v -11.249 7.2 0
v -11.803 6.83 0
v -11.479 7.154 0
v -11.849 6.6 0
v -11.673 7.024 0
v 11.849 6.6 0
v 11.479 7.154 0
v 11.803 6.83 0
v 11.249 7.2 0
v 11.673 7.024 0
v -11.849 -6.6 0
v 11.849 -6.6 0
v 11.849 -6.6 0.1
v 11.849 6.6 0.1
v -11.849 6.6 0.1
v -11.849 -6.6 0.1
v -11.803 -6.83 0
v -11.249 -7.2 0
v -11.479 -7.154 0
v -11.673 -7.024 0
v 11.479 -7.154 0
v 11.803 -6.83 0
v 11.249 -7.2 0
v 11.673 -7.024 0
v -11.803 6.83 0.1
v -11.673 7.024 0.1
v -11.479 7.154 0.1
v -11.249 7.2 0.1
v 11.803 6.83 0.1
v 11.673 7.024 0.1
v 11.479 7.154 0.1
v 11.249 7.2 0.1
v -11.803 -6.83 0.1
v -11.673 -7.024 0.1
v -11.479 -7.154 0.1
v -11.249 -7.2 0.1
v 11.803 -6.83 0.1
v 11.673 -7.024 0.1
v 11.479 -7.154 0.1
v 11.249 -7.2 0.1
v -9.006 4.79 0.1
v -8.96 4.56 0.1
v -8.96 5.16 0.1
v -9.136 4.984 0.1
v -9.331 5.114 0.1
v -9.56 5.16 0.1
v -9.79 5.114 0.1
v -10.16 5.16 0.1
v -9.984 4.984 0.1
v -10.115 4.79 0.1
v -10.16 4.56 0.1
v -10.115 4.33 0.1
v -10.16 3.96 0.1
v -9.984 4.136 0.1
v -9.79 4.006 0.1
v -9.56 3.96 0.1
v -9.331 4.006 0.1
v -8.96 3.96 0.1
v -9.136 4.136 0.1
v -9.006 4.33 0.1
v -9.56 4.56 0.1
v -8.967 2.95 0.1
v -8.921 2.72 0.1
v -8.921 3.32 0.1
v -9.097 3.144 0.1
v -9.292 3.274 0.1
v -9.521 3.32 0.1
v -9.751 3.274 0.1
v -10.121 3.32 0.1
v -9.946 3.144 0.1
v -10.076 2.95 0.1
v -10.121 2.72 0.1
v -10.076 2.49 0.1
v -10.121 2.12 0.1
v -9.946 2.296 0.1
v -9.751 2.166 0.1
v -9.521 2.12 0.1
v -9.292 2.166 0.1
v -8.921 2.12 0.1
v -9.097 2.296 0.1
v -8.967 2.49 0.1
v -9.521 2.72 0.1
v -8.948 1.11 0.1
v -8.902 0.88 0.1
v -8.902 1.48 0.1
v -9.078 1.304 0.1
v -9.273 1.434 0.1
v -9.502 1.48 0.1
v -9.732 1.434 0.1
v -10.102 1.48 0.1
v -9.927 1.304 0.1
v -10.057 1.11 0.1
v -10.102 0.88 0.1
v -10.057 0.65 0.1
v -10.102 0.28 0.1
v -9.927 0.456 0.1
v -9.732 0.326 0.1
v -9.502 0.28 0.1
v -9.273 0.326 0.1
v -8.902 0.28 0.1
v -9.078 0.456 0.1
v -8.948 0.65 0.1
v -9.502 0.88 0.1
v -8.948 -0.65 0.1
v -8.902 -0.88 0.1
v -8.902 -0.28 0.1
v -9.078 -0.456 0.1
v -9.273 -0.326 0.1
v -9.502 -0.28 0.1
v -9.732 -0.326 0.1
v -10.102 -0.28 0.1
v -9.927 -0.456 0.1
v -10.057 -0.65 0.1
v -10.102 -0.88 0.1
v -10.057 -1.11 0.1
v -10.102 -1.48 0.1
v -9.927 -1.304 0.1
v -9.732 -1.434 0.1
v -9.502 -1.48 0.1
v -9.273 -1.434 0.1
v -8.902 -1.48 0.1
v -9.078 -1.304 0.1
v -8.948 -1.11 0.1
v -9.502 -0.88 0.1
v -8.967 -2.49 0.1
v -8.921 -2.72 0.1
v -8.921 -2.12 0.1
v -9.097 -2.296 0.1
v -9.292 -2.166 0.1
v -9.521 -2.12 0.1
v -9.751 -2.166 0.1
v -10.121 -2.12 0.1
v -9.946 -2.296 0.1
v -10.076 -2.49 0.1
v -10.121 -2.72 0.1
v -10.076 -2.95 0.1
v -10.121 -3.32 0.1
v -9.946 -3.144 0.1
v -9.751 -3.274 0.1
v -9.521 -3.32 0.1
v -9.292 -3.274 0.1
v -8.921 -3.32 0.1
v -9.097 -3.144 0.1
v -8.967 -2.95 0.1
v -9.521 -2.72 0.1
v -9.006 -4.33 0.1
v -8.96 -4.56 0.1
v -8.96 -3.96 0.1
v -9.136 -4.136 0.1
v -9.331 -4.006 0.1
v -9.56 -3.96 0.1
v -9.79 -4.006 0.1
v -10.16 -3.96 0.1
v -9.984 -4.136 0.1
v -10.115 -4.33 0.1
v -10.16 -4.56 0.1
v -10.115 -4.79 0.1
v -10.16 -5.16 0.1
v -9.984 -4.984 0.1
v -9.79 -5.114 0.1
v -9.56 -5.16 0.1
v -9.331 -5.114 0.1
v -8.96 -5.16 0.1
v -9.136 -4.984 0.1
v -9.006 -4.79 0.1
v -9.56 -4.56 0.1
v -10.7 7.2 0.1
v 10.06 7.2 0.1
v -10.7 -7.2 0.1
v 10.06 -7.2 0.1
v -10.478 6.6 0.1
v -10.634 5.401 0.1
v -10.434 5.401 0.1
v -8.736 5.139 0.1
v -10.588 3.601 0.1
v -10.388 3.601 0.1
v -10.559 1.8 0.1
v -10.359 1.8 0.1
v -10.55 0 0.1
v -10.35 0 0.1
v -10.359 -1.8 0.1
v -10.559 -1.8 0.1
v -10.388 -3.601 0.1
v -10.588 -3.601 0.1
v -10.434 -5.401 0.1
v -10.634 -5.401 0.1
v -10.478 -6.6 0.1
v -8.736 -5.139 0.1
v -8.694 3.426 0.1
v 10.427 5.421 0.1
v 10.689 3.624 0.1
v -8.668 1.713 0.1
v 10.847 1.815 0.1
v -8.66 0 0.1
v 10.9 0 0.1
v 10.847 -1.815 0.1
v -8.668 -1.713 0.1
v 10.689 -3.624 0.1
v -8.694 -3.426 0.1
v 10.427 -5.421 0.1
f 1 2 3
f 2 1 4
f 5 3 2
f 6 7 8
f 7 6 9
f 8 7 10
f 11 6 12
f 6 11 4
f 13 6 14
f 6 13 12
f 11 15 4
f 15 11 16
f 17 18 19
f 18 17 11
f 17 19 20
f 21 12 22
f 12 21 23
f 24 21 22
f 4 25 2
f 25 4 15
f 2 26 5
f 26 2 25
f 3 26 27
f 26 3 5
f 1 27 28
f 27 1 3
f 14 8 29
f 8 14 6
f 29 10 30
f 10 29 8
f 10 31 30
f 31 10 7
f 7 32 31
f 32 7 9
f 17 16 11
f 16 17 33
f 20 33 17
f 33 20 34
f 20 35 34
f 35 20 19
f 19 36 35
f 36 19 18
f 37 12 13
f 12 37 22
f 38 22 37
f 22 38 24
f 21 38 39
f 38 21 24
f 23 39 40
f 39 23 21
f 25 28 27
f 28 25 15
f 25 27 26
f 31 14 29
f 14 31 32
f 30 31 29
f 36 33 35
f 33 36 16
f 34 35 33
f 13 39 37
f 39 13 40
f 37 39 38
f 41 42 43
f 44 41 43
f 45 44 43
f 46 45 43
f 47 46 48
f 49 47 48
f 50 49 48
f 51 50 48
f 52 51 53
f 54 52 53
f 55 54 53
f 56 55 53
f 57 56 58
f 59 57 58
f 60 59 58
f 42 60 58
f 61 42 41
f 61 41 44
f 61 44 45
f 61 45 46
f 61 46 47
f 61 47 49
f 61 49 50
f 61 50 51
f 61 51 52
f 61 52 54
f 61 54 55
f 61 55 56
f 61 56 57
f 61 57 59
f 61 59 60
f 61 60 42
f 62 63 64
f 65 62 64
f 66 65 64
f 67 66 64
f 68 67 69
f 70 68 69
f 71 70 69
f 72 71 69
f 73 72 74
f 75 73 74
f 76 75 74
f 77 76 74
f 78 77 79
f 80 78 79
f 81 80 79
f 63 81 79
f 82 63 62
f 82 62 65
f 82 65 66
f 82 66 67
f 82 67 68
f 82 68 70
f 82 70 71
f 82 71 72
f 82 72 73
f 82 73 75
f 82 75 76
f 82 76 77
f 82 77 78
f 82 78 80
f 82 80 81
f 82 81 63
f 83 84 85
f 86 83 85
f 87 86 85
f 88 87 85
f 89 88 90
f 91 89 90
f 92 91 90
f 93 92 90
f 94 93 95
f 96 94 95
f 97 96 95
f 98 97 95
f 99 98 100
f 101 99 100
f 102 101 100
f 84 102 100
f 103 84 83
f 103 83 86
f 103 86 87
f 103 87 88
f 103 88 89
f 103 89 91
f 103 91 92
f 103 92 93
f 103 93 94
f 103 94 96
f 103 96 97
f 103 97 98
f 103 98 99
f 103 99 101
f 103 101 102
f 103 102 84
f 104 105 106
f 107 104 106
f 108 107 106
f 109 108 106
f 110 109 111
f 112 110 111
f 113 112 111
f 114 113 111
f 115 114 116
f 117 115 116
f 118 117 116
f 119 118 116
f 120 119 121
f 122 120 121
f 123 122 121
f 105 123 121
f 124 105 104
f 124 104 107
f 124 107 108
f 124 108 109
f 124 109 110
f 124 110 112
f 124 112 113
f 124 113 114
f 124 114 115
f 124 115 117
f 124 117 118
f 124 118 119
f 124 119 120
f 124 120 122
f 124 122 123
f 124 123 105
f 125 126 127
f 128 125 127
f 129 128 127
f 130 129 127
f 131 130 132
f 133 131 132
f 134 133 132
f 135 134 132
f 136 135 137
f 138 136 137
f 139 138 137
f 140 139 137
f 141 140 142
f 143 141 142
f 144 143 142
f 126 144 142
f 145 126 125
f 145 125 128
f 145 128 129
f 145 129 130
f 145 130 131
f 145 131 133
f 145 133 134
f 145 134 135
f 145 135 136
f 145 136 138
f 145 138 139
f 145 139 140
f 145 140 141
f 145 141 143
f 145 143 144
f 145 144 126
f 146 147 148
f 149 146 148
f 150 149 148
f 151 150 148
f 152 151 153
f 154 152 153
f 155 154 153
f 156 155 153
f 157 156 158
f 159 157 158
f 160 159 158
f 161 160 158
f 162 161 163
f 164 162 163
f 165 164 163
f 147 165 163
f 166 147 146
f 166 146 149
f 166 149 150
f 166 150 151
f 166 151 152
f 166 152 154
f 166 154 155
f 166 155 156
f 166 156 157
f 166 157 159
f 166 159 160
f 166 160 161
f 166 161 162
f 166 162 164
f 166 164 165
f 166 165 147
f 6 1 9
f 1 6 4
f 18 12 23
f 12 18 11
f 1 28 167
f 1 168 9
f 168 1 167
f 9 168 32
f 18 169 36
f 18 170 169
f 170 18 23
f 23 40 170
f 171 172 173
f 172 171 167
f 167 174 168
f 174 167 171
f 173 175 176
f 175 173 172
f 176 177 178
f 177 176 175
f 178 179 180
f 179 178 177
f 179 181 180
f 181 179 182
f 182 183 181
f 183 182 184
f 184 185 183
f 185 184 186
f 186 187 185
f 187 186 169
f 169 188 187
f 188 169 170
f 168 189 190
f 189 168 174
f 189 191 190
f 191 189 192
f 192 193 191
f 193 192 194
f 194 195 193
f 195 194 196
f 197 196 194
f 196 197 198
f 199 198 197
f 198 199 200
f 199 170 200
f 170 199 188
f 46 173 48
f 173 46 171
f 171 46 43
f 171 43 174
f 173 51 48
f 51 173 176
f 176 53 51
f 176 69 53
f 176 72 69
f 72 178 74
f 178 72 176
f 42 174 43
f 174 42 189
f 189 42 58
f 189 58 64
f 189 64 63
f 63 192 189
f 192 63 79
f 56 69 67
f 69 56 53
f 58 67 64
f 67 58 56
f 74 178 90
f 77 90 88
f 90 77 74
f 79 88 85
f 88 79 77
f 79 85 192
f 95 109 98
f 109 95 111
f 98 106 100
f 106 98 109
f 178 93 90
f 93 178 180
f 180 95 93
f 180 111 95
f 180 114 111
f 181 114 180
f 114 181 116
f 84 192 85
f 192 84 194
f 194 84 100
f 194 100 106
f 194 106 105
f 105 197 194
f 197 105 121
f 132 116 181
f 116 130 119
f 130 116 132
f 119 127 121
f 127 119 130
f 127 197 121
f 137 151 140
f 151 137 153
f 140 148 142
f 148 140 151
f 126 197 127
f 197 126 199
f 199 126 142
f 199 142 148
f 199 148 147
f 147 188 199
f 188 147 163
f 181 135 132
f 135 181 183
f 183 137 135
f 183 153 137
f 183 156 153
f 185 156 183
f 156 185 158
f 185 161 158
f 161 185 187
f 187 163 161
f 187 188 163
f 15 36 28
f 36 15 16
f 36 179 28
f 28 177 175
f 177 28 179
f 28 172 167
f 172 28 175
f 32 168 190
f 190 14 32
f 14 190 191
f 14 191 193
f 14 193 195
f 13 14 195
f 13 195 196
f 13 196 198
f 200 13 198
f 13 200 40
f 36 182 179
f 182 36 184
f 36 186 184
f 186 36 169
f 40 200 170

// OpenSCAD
// file: ../p/box3u12.scad
use <../lib.scad>
function ldraw_lib__box3u12() = [
// 0 Box with 3 Parallel Faces without Any Edges
// 0 Name: box3u12.dat
// 0 Author: J.C. Tchang [tchang]
// 0 !LDRAW_ORG Primitive UPDATE 2014-02
// 0 !LICENSE Licensed under CC BY 4.0 : see CAreadme.txt
// 
// 0 BFC CERTIFY CCW
  [0,"BFC","CERTIFY"],
  [0,"BFC","CCW"],
// 
// 0 !HISTORY 2014-12-23 [PTadmin] Official Update 2014-02
// 
// 
// 4 16 -1 1 1 1 1 1 1 1 -1 -1 1 -1
  [4,16,-1,1,1,1,1,1,1,1,-1,-1,1,-1],
// 4 16 -1 1 1 -1 0 1 1 0 1 1 1 1
  [4,16,-1,1,1,-1,0,1,1,0,1,1,1,1],
// 4 16 1 1 -1 1 0 -1 -1 0 -1 -1 1 -1
  [4,16,1,1,-1,1,0,-1,-1,0,-1,-1,1,-1],
];
module ldraw_lib__box3u12(step=0, col=false, unit=2/5, alt=false, line=0.2, solid=!$preview)
    makepoly(ldraw_lib__box3u12(), step=step, col=col, unit=unit, alt=alt, line=line, solid=solid);
ldraw_lib__box3u12(line=0.2);
// file: ../p/4-4ndis.scad
use <../lib.scad>
function ldraw_lib__4_4ndis() = [
// 0 Disc Negative 1.0
// 0 Name: 4-4ndis.dat
// 0 Author: James Jessiman
// 0 !LDRAW_ORG Primitive UPDATE 2012-01
// 0 !LICENSE Licensed under CC BY 4.0 : see CAreadme.txt
// 
// 0 BFC CERTIFY CCW
  [0,"BFC","CERTIFY"],
  [0,"BFC","CCW"],
// 
// 0 !HISTORY 2002-03-23 [sbliss] Added BFC statement; compacted code
// 0 !HISTORY 2002-04-25 [PTadmin] Official Update 2002-02
// 0 !HISTORY 2007-06-24 [PTadmin] Header formatted for Contributor Agreement
// 0 !HISTORY 2008-07-01 [PTadmin] Official Update 2008-01
// 0 !HISTORY 2012-02-16 [Philo] Changed to CCW
// 0 !HISTORY 2012-03-30 [PTadmin] Official Update 2012-01
// 
// 
// 3 16 0.9239 0 0.3827 1 0 0 1 0 1
  [3,16,0.9239,0,0.3827,1,0,0,1,0,1],
// 3 16 0.7071 0 0.7071 0.9239 0 0.3827 1 0 1
  [3,16,0.7071,0,0.7071,0.9239,0,0.3827,1,0,1],
// 3 16 0.3827 0 0.9239 0.7071 0 0.7071 1 0 1
  [3,16,0.3827,0,0.9239,0.7071,0,0.7071,1,0,1],
// 3 16 0 0 1 0.3827 0 0.9239 1 0 1
  [3,16,0,0,1,0.3827,0,0.9239,1,0,1],
// 3 16 -0.3827 0 0.9239 0 0 1 -1 0 1
  [3,16,-0.3827,0,0.9239,0,0,1,-1,0,1],
// 3 16 -0.7071 0 0.7071 -0.3827 0 0.9239 -1 0 1
  [3,16,-0.7071,0,0.7071,-0.3827,0,0.9239,-1,0,1],
// 3 16 -0.9239 0 0.3827 -0.7071 0 0.7071 -1 0 1
  [3,16,-0.9239,0,0.3827,-0.7071,0,0.7071,-1,0,1],
// 3 16 -1 0 0 -0.9239 0 0.3827 -1 0 1
  [3,16,-1,0,0,-0.9239,0,0.3827,-1,0,1],
// 3 16 -0.9239 0 -0.3827 -1 0 0 -1 0 -1
  [3,16,-0.9239,0,-0.3827,-1,0,0,-1,0,-1],
// 3 16 -0.7071 0 -0.7071 -0.9239 0 -0.3827 -1 0 -1
  [3,16,-0.7071,0,-0.7071,-0.9239,0,-0.3827,-1,0,-1],
// 3 16 -0.3827 0 -0.9239 -0.7071 0 -0.7071 -1 0 -1
  [3,16,-0.3827,0,-0.9239,-0.7071,0,-0.7071,-1,0,-1],
// 3 16 0 0 -1 -0.3827 0 -0.9239 -1 0 -1
  [3,16,0,0,-1,-0.3827,0,-0.9239,-1,0,-1],
// 3 16 0.3827 0 -0.9239 0 0 -1 1 0 -1
  [3,16,0.3827,0,-0.9239,0,0,-1,1,0,-1],
// 3 16 0.7071 0 -0.7071 0.3827 0 -0.9239 1 0 -1
  [3,16,0.7071,0,-0.7071,0.3827,0,-0.9239,1,0,-1],
// 3 16 0.9239 0 -0.3827 0.7071 0 -0.7071 1 0 -1
  [3,16,0.9239,0,-0.3827,0.7071,0,-0.7071,1,0,-1],
// 3 16 1 0 0 0.9239 0 -0.3827 1 0 -1
  [3,16,1,0,0,0.9239,0,-0.3827,1,0,-1],
];
module ldraw_lib__4_4ndis(step=0, col=false, unit=2/5, alt=false, line=0.2, solid=!$preview)
    makepoly(ldraw_lib__4_4ndis(), step=step, col=col, unit=unit, alt=alt, line=line, solid=solid);
ldraw_lib__4_4ndis(line=0.2);
// file: ../p/4-4disc.scad
use <../lib.scad>
function ldraw_lib__4_4disc() = [
// 0 Disc 1.0
// 0 Name: 4-4disc.dat
// 0 Author: James Jessiman
// 0 !LDRAW_ORG Primitive UPDATE 2002-02
// 0 !LICENSE Licensed under CC BY 4.0 : see CAreadme.txt
// 
// 0 BFC CERTIFY CCW
  [0,"BFC","CERTIFY"],
  [0,"BFC","CCW"],
// 
// 0 !HISTORY 1998-12-15 [PTadmin] Official Update 1998-10
// 0 !HISTORY 2002-03-23 [sbliss] Added BFC statement
// 0 !HISTORY 2002-04-25 [PTadmin] Official Update 2002-02
// 0 !HISTORY 2007-06-24 [PTadmin] Header formatted for Contributor Agreement
// 0 !HISTORY 2008-07-01 [PTadmin] Official Update 2008-01
// 
// 
// 3 16 0 0 0 1 0 0 0.9239 0 0.3827
  [3,16,0,0,0,1,0,0,0.9239,0,0.3827],
// 3 16 0 0 0 0.9239 0 0.3827 0.7071 0 0.7071
  [3,16,0,0,0,0.9239,0,0.3827,0.7071,0,0.7071],
// 3 16 0 0 0 0.7071 0 0.7071 0.3827 0 0.9239
  [3,16,0,0,0,0.7071,0,0.7071,0.3827,0,0.9239],
// 3 16 0 0 0 0.3827 0 0.9239 0 0 1
  [3,16,0,0,0,0.3827,0,0.9239,0,0,1],
// 3 16 0 0 0 0 0 1 -0.3827 0 0.9239
  [3,16,0,0,0,0,0,1,-0.3827,0,0.9239],
// 3 16 0 0 0 -0.3827 0 0.9239 -0.7071 0 0.7071
  [3,16,0,0,0,-0.3827,0,0.9239,-0.7071,0,0.7071],
// 3 16 0 0 0 -0.7071 0 0.7071 -0.9239 0 0.3827
  [3,16,0,0,0,-0.7071,0,0.7071,-0.9239,0,0.3827],
// 3 16 0 0 0 -0.9239 0 0.3827 -1 0 -0
  [3,16,0,0,0,-0.9239,0,0.3827,-1,0,-0],
// 3 16 0 0 0 -1 0 -0 -0.9239 0 -0.3827
  [3,16,0,0,0,-1,0,-0,-0.9239,0,-0.3827],
// 3 16 0 0 0 -0.9239 0 -0.3827 -0.7071 0 -0.7071
  [3,16,0,0,0,-0.9239,0,-0.3827,-0.7071,0,-0.7071],
// 3 16 0 0 0 -0.7071 0 -0.7071 -0.3827 0 -0.9239
  [3,16,0,0,0,-0.7071,0,-0.7071,-0.3827,0,-0.9239],
// 3 16 0 0 0 -0.3827 0 -0.9239 0 0 -1
  [3,16,0,0,0,-0.3827,0,-0.9239,0,0,-1],
// 3 16 0 0 0 0 0 -1 0.3827 0 -0.9239
  [3,16,0,0,0,0,0,-1,0.3827,0,-0.9239],
// 3 16 0 0 0 0.3827 0 -0.9239 0.7071 0 -0.7071
  [3,16,0,0,0,0.3827,0,-0.9239,0.7071,0,-0.7071],
// 3 16 0 0 0 0.7071 0 -0.7071 0.9239 0 -0.3827
  [3,16,0,0,0,0.7071,0,-0.7071,0.9239,0,-0.3827],
// 3 16 0 0 0 0.9239 0 -0.3827 1 0 0
  [3,16,0,0,0,0.9239,0,-0.3827,1,0,0],
// 0
];
module ldraw_lib__4_4disc(step=0, col=false, unit=2/5, alt=false, line=0.2, solid=!$preview)
    makepoly(ldraw_lib__4_4disc(), step=step, col=col, unit=unit, alt=alt, line=line, solid=solid);
ldraw_lib__4_4disc(line=0.2);
// file: ../p/1-4cyli.scad
use <../lib.scad>
function ldraw_lib__1_4cyli() = [
// 0 Cylinder 0.25
// 0 Name: 1-4cyli.dat
// 0 Author: James Jessiman
// 0 !LDRAW_ORG Primitive UPDATE 2012-01
// 0 !LICENSE Licensed under CC BY 4.0 : see CAreadme.txt
// 
// 0 BFC CERTIFY CCW
  [0,"BFC","CERTIFY"],
  [0,"BFC","CCW"],
// 
// 0 !HISTORY 2002-03-23 [sbliss] Added BFC statement.
// 0 !HISTORY 2002-04-25 [PTadmin] Official Update 2002-02
// 0 !HISTORY 2007-06-22 [PTadmin] Header formatted for Contributor Agreement
// 0 !HISTORY 2008-07-01 [PTadmin] Official Update 2008-01
// 0 !HISTORY 2012-02-16 [Philo] Changed to CCW
// 0 !HISTORY 2012-03-30 [PTadmin] Official Update 2012-01
// 
// 
// 4 16 1 1 0 0.9239 1 0.3827 0.9239 0 0.3827 1 0 0
  [4,16,1,1,0,0.9239,1,0.3827,0.9239,0,0.3827,1,0,0],
// 5 24 1 0 0 1 1 0 0.9239 0 0.3827 1 0 -1
  [5,24,1,0,0,1,1,0,0.9239,0,0.3827,1,0,-1],
// 4 16 0.9239 1 0.3827 0.7071 1 0.7071 0.7071 0 0.7071 0.9239 0 0.3827
  [4,16,0.9239,1,0.3827,0.7071,1,0.7071,0.7071,0,0.7071,0.9239,0,0.3827],
// 5 24 0.9239 0 0.3827 0.9239 1 0.3827 0.7071 0 0.7071 1 0 0
  [5,24,0.9239,0,0.3827,0.9239,1,0.3827,0.7071,0,0.7071,1,0,0],
// 4 16 0.7071 1 0.7071 0.3827 1 0.9239 0.3827 0 0.9239 0.7071 0 0.7071
  [4,16,0.7071,1,0.7071,0.3827,1,0.9239,0.3827,0,0.9239,0.7071,0,0.7071],
// 5 24 0.7071 0 0.7071 0.7071 1 0.7071 0.3827 0 0.9239 0.9239 0 0.3827
  [5,24,0.7071,0,0.7071,0.7071,1,0.7071,0.3827,0,0.9239,0.9239,0,0.3827],
// 4 16 0.3827 1 0.9239 0 1 1 0 0 1 0.3827 0 0.9239
  [4,16,0.3827,1,0.9239,0,1,1,0,0,1,0.3827,0,0.9239],
// 5 24 0.3827 0 0.9239 0.3827 1 0.9239 0 0 1 0.7071 0 0.7071
  [5,24,0.3827,0,0.9239,0.3827,1,0.9239,0,0,1,0.7071,0,0.7071],
// 5 24 0 0 1 0 1 1 0.3827 0 0.9239 -1 0 1
  [5,24,0,0,1,0,1,1,0.3827,0,0.9239,-1,0,1],
];
module ldraw_lib__1_4cyli(step=0, col=false, unit=2/5, alt=false, line=0.2, solid=!$preview)
    makepoly(ldraw_lib__1_4cyli(), step=step, col=col, unit=unit, alt=alt, line=line, solid=solid);
ldraw_lib__1_4cyli(line=0.2);
// file: ../p/1-4chrd.scad
use <../lib.scad>
function ldraw_lib__1_4chrd() = [
// 0 Chord 0.25
// 0 Name: 1-4chrd.dat
// 0 Author: Max Martin Richter [MMR1988]
// 0 !LDRAW_ORG Primitive UPDATE 2023-05
// 0 !LICENSE Licensed under CC BY 4.0 : see CAreadme.txt
// 
// 0 BFC CERTIFY CCW
  [0,"BFC","CERTIFY"],
  [0,"BFC","CCW"],
// 
// 0 !HISTORY 2004-04-22 [PTadmin] Official Update 2004-02
// 0 !HISTORY 2007-10-09 [PTadmin] Header formatted for Contributor Agreement
// 0 !HISTORY 2008-07-01 [PTadmin] Official Update 2008-01
// 0 !HISTORY 2012-08-02 [MMR1988] Re-creation with PrimGen2 and Rectifier
// 0 !HISTORY 2012-08-09 [PTadmin] Official Update 2012-02
// 0 !HISTORY 2023-10-27 [OrionP] Change author to MMR1988 from hafhead
// 0 !HISTORY 2023-10-31 [OrionP] Official Update 2023-05
// 
// 4 16 0.9239 0 0.3827 0.3827 0 0.9239 0 0 1 1 0 0
  [4,16,0.9239,0,0.3827,0.3827,0,0.9239,0,0,1,1,0,0],
// 3 16 0.7071 0 0.7071 0.3827 0 0.9239 0.9239 0 0.3827
  [3,16,0.7071,0,0.7071,0.3827,0,0.9239,0.9239,0,0.3827],
];
module ldraw_lib__1_4chrd(step=0, col=false, unit=2/5, alt=false, line=0.2, solid=!$preview)
    makepoly(ldraw_lib__1_4chrd(), step=step, col=col, unit=unit, alt=alt, line=line, solid=solid);
ldraw_lib__1_4chrd(line=0.2);
// main file
use <../lib.scad>
use <../p/1-4chrd.scad>
use <../p/1-4cyli.scad>
use <../p/4-4disc.scad>
use <../p/4-4ndis.scad>
use <../p/box3u12.scad>
function ldraw_lib__6141955b() = [
// 0 Sticker  1.8 x  3.0 with 6 Red Dots on Black Arc on White Background
// 0 Name: 6141955b.dat
// 0 Author: Massimo Maso [Sirio]
// 0 !LDRAW_ORG Part UPDATE 2025-03
// 0 !LICENSE Licensed under CC BY 4.0 : see CAreadme.txt
// 
// 0 BFC CERTIFY CCW
  [0,"BFC","CERTIFY"],
  [0,"BFC","CCW"],
// 
// 0 !KEYWORDS Bricklink 75871stk01a, Brickowl 197362, Ford, GT, Mustang
// 0 !KEYWORDS Rebrickable 24746, Set 75871, Speed Champions
// 
// 0 !HISTORY 2025-03-30 [OrionP] Official Update 2025-03
// 
// 0 // Primitives
// 1 16 -28.1228 0 16.5 -1.5 0 0 0 -1 0 0 0 1.5 1-4chrd.dat
  [1,16,-28.1228,0,16.5,-1.5,0,0,0,-1,0,0,0,1.5, ldraw_lib__1_4chrd()],
// 1 16 28.1228 0 16.5 1.5 0 0 0 -1 0 0 0 1.5 1-4chrd.dat
  [1,16,28.1228,0,16.5,1.5,0,0,0,-1,0,0,0,1.5, ldraw_lib__1_4chrd()],
// 1 16 0 -.25 0 0 0 29.6228 0 .25 0 16.5 0 0 box3u12.dat
  [1,16,0,-.25,0,0,0,29.6228,0,.25,0,16.5,0,0, ldraw_lib__box3u12()],
// 1 16 -28.1228 0 -16.5 -1.5 0 0 0 -1 0 0 0 -1.5 1-4chrd.dat
  [1,16,-28.1228,0,-16.5,-1.5,0,0,0,-1,0,0,0,-1.5, ldraw_lib__1_4chrd()],
// 1 16 28.1228 0 -16.5 1.5 0 0 0 -1 0 0 0 -1.5 1-4chrd.dat
  [1,16,28.1228,0,-16.5,1.5,0,0,0,-1,0,0,0,-1.5, ldraw_lib__1_4chrd()],
// 1 16 -28.1228 0 16.5 -1.5 0 0 0 -.25 0 0 0 1.5 1-4cyli.dat
  [1,16,-28.1228,0,16.5,-1.5,0,0,0,-.25,0,0,0,1.5, ldraw_lib__1_4cyli()],
// 1 16 28.1228 0 16.5 1.5 0 0 0 -.25 0 0 0 1.5 1-4cyli.dat
  [1,16,28.1228,0,16.5,1.5,0,0,0,-.25,0,0,0,1.5, ldraw_lib__1_4cyli()],
// 1 16 -28.1228 0 -16.5 -1.5 0 0 0 -.25 0 0 0 -1.5 1-4cyli.dat
  [1,16,-28.1228,0,-16.5,-1.5,0,0,0,-.25,0,0,0,-1.5, ldraw_lib__1_4cyli()],
// 1 16 28.1228 0 -16.5 1.5 0 0 0 -.25 0 0 0 -1.5 1-4cyli.dat
  [1,16,28.1228,0,-16.5,1.5,0,0,0,-.25,0,0,0,-1.5, ldraw_lib__1_4cyli()],
// 1 15 -28.1228 -.25 16.5 -1.5 0 0 0 1 0 0 0 1.5 1-4chrd.dat
  [1,15,-28.1228,-.25,16.5,-1.5,0,0,0,1,0,0,0,1.5, ldraw_lib__1_4chrd()],
// 1 15 28.1228 -.25 16.5 1.5 0 0 0 1 0 0 0 1.5 1-4chrd.dat
  [1,15,28.1228,-.25,16.5,1.5,0,0,0,1,0,0,0,1.5, ldraw_lib__1_4chrd()],
// 1 15 -28.1228 -.25 -16.5 -1.5 0 0 0 1 0 0 0 -1.5 1-4chrd.dat
  [1,15,-28.1228,-.25,-16.5,-1.5,0,0,0,1,0,0,0,-1.5, ldraw_lib__1_4chrd()],
// 1 15 28.1228 -.25 -16.5 1.5 0 0 0 1 0 0 0 -1.5 1-4chrd.dat
  [1,15,28.1228,-.25,-16.5,1.5,0,0,0,1,0,0,0,-1.5, ldraw_lib__1_4chrd()],
// 1 320 -23.9004 -.25 11.4 1.5 0 0 0 1 0 0 0 1.5 4-4ndis.dat
  [1,320,-23.9004,-.25,11.4,1.5,0,0,0,1,0,0,0,1.5, ldraw_lib__4_4ndis()],
// 1 4 -23.9004 -.25 11.4 1.5 0 0 0 1 0 0 0 1.5 4-4disc.dat
  [1,4,-23.9004,-.25,11.4,1.5,0,0,0,1,0,0,0,1.5, ldraw_lib__4_4disc()],
// 1 320 -23.8035 -.25 6.8 1.5 0 0 0 1 0 0 0 1.5 4-4ndis.dat
  [1,320,-23.8035,-.25,6.8,1.5,0,0,0,1,0,0,0,1.5, ldraw_lib__4_4ndis()],
// 1 4 -23.8035 -.25 6.8 1.5 0 0 0 1 0 0 0 1.5 4-4disc.dat
  [1,4,-23.8035,-.25,6.8,1.5,0,0,0,1,0,0,0,1.5, ldraw_lib__4_4disc()],
// 1 320 -23.7556 -.25 2.2 1.5 0 0 0 1 0 0 0 1.5 4-4ndis.dat
  [1,320,-23.7556,-.25,2.2,1.5,0,0,0,1,0,0,0,1.5, ldraw_lib__4_4ndis()],
// 1 4 -23.7556 -.25 2.2 1.5 0 0 0 1 0 0 0 1.5 4-4disc.dat
  [1,4,-23.7556,-.25,2.2,1.5,0,0,0,1,0,0,0,1.5, ldraw_lib__4_4disc()],
// 1 320 -23.7556 -.25 -2.2 1.5 0 0 0 1 0 0 0 1.5 4-4ndis.dat
  [1,320,-23.7556,-.25,-2.2,1.5,0,0,0,1,0,0,0,1.5, ldraw_lib__4_4ndis()],
// 1 4 -23.7556 -.25 -2.2 1.5 0 0 0 1 0 0 0 1.5 4-4disc.dat
  [1,4,-23.7556,-.25,-2.2,1.5,0,0,0,1,0,0,0,1.5, ldraw_lib__4_4disc()],
// 1 320 -23.8035 -.25 -6.8 1.5 0 0 0 1 0 0 0 1.5 4-4ndis.dat
  [1,320,-23.8035,-.25,-6.8,1.5,0,0,0,1,0,0,0,1.5, ldraw_lib__4_4ndis()],
// 1 4 -23.8035 -.25 -6.8 1.5 0 0 0 1 0 0 0 1.5 4-4disc.dat
  [1,4,-23.8035,-.25,-6.8,1.5,0,0,0,1,0,0,0,1.5, ldraw_lib__4_4disc()],
// 1 320 -23.9004 -.25 -11.4 1.5 0 0 0 1 0 0 0 1.5 4-4ndis.dat
  [1,320,-23.9004,-.25,-11.4,1.5,0,0,0,1,0,0,0,1.5, ldraw_lib__4_4ndis()],
// 1 4 -23.9004 -.25 -11.4 1.5 0 0 0 1 0 0 0 1.5 4-4disc.dat
  [1,4,-23.9004,-.25,-11.4,1.5,0,0,0,1,0,0,0,1.5, ldraw_lib__4_4disc()],
// 0 // Bottom face
// 4 16 -28.1228 0 18 28.1228 0 18 29.6228 0 16.5 -29.6228 0 16.5
  [4,16,-28.1228,0,18,28.1228,0,18,29.6228,0,16.5,-29.6228,0,16.5],
// 4 16 -28.1228 0 -18 -29.6228 0 -16.5 29.6228 0 -16.5 28.1228 0 -18
  [4,16,-28.1228,0,-18,-29.6228,0,-16.5,29.6228,0,-16.5,28.1228,0,-18],
// 0 // Lateral face
// 3 16 -28.1228 0 18 -28.1228 -.25 18 -26.75 -.25 18
  [3,16,-28.1228,0,18,-28.1228,-.25,18,-26.75,-.25,18],
// 4 16 -28.1228 0 18 -26.75 -.25 18 25.15 -.25 18 28.1228 0 18
  [4,16,-28.1228,0,18,-26.75,-.25,18,25.15,-.25,18,28.1228,0,18],
// 3 16 28.1228 0 18 25.15 -.25 18 28.1228 -.25 18
  [3,16,28.1228,0,18,25.15,-.25,18,28.1228,-.25,18],
// 3 16 -28.1228 0 -18 -26.75 -.25 -18 -28.1228 -.25 -18
  [3,16,-28.1228,0,-18,-26.75,-.25,-18,-28.1228,-.25,-18],
// 4 16 -28.1228 0 -18 28.1228 0 -18 25.15 -.25 -18 -26.75 -.25 -18
  [4,16,-28.1228,0,-18,28.1228,0,-18,25.15,-.25,-18,-26.75,-.25,-18],
// 3 16 28.1228 0 -18 28.1228 -.25 -18 25.15 -.25 -18
  [3,16,28.1228,0,-18,28.1228,-.25,-18,25.15,-.25,-18],
// 0 // Top face
// 0 // Black faces
// 4 0 -26.75 -.25 18 -26.586 -.25 13.5017 -26.086 -.25 13.5017 -26.1953 -.25 16.5
  [4,0,-26.75,-.25,18,-26.586,-.25,13.5017,-26.086,-.25,13.5017,-26.1953,-.25,16.5],
// 4 0 -26.75 -.25 18 -26.1953 -.25 16.5 -21.841 -.25 12.8463 25.15 -.25 18
  [4,0,-26.75,-.25,18,-26.1953,-.25,16.5,-21.841,-.25,12.8463,25.15,-.25,18],
// 4 0 -26.4688 -.25 9.002 -25.9688 -.25 9.002 -26.086 -.25 13.5017 -26.586 -.25 13.5017
  [4,0,-26.4688,-.25,9.002,-25.9688,-.25,9.002,-26.086,-.25,13.5017,-26.586,-.25,13.5017],
// 4 0 -26.4688 -.25 9.002 -26.3984 -.25 4.5012 -25.8984 -.25 4.5012 -25.9688 -.25 9.002
  [4,0,-26.4688,-.25,9.002,-26.3984,-.25,4.5012,-25.8984,-.25,4.5012,-25.9688,-.25,9.002],
// 4 0 -26.375 -.25 0 -25.875 -.25 0 -25.8984 -.25 4.5012 -26.3984 -.25 4.5012
  [4,0,-26.375,-.25,0,-25.875,-.25,0,-25.8984,-.25,4.5012,-26.3984,-.25,4.5012],
// 4 0 -26.375 -.25 0 -26.3984 -.25 -4.5012 -25.8984 -.25 -4.5012 -25.875 -.25 0
  [4,0,-26.375,-.25,0,-26.3984,-.25,-4.5012,-25.8984,-.25,-4.5012,-25.875,-.25,0],
// 4 0 -26.4688 -.25 -9.002 -25.9688 -.25 -9.002 -25.8984 -.25 -4.5012 -26.3984 -.25 -4.5012
  [4,0,-26.4688,-.25,-9.002,-25.9688,-.25,-9.002,-25.8984,-.25,-4.5012,-26.3984,-.25,-4.5012],
// 4 0 -26.4688 -.25 -9.002 -26.586 -.25 -13.5017 -26.086 -.25 -13.5017 -25.9688 -.25 -9.002
  [4,0,-26.4688,-.25,-9.002,-26.586,-.25,-13.5017,-26.086,-.25,-13.5017,-25.9688,-.25,-9.002],
// 4 0 -26.75 -.25 -18 -26.1953 -.25 -16.5 -26.086 -.25 -13.5017 -26.586 -.25 -13.5017
  [4,0,-26.75,-.25,-18,-26.1953,-.25,-16.5,-26.086,-.25,-13.5017,-26.586,-.25,-13.5017],
// 4 0 -26.75 -.25 -18 25.15 -.25 -18 -21.841 -.25 -12.8463 -26.1953 -.25 -16.5
  [4,0,-26.75,-.25,-18,25.15,-.25,-18,-21.841,-.25,-12.8463,-26.1953,-.25,-16.5],
// 4 0 -21.7349 -.25 8.5649 26.0664 -.25 13.5534 25.15 -.25 18 -21.841 -.25 12.8463
  [4,0,-21.7349,-.25,8.5649,26.0664,-.25,13.5534,25.15,-.25,18,-21.841,-.25,12.8463],
// 4 0 -21.7349 -.25 8.5649 -21.6712 -.25 4.2827 26.7232 -.25 9.061 26.0664 -.25 13.5534
  [4,0,-21.7349,-.25,8.5649,-21.6712,-.25,4.2827,26.7232,-.25,9.061,26.0664,-.25,13.5534],
// 4 0 -21.65 -.25 0 27.1182 -.25 4.5382 26.7232 -.25 9.061 -21.6712 -.25 4.2827
  [4,0,-21.65,-.25,0,27.1182,-.25,4.5382,26.7232,-.25,9.061,-21.6712,-.25,4.2827],
// 4 0 -21.65 -.25 0 27.1182 -.25 -4.5382 27.25 -.25 0 27.1182 -.25 4.5382
  [4,0,-21.65,-.25,0,27.1182,-.25,-4.5382,27.25,-.25,0,27.1182,-.25,4.5382],
// 4 0 -21.65 -.25 0 -21.6712 -.25 -4.2827 26.7232 -.25 -9.061 27.1182 -.25 -4.5382
  [4,0,-21.65,-.25,0,-21.6712,-.25,-4.2827,26.7232,-.25,-9.061,27.1182,-.25,-4.5382],
// 4 0 -21.7349 -.25 -8.5649 26.0664 -.25 -13.5534 26.7232 -.25 -9.061 -21.6712 -.25 -4.2827
  [4,0,-21.7349,-.25,-8.5649,26.0664,-.25,-13.5534,26.7232,-.25,-9.061,-21.6712,-.25,-4.2827],
// 4 0 -21.7349 -.25 -8.5649 -21.841 -.25 -12.8463 25.15 -.25 -18 26.0664 -.25 -13.5534
  [4,0,-21.7349,-.25,-8.5649,-21.841,-.25,-12.8463,25.15,-.25,-18,26.0664,-.25,-13.5534],
// 0 // Dark red faces
// 4 320 -26.1953 -.25 16.5 -26.086 -.25 13.5017 -25.4004 -.25 12.9 -23.9004 -.25 12.9
  [4,320,-26.1953,-.25,16.5,-26.086,-.25,13.5017,-25.4004,-.25,12.9,-23.9004,-.25,12.9],
// 3 320 -26.1953 -.25 16.5 -23.9004 -.25 12.9 -22.4004 -.25 12.9
  [3,320,-26.1953,-.25,16.5,-23.9004,-.25,12.9,-22.4004,-.25,12.9],
// 3 320 -26.1953 -.25 16.5 -22.4004 -.25 12.9 -21.841 -.25 12.8463
  [3,320,-26.1953,-.25,16.5,-22.4004,-.25,12.9,-21.841,-.25,12.8463],
// 4 320 -25.9688 -.25 9.002 -25.4004 -.25 11.4 -25.4004 -.25 12.9 -26.086 -.25 13.5017
  [4,320,-25.9688,-.25,9.002,-25.4004,-.25,11.4,-25.4004,-.25,12.9,-26.086,-.25,13.5017],
// 3 320 -25.9688 -.25 9.002 -25.4004 -.25 9.9 -25.4004 -.25 11.4
  [3,320,-25.9688,-.25,9.002,-25.4004,-.25,9.9,-25.4004,-.25,11.4],
// 3 320 -25.9688 -.25 9.002 -25.3035 -.25 8.3 -25.4004 -.25 9.9
  [3,320,-25.9688,-.25,9.002,-25.3035,-.25,8.3,-25.4004,-.25,9.9],
// 3 320 -25.9688 -.25 9.002 -25.3035 -.25 6.8 -25.3035 -.25 8.3
  [3,320,-25.9688,-.25,9.002,-25.3035,-.25,6.8,-25.3035,-.25,8.3],
// 4 320 -25.8984 -.25 4.5012 -25.3035 -.25 5.3 -25.3035 -.25 6.8 -25.9688 -.25 9.002
  [4,320,-25.8984,-.25,4.5012,-25.3035,-.25,5.3,-25.3035,-.25,6.8,-25.9688,-.25,9.002],
// 4 320 -21.7349 -.25 8.5649 -21.841 -.25 12.8463 -22.4004 -.25 12.9 -22.4004 -.25 11.4
  [4,320,-21.7349,-.25,8.5649,-21.841,-.25,12.8463,-22.4004,-.25,12.9,-22.4004,-.25,11.4],
// 3 320 -21.7349 -.25 8.5649 -22.4004 -.25 11.4 -22.4004 -.25 9.9
  [3,320,-21.7349,-.25,8.5649,-22.4004,-.25,11.4,-22.4004,-.25,9.9],
// 3 320 -21.7349 -.25 8.5649 -22.4004 -.25 9.9 -22.3035 -.25 8.3
  [3,320,-21.7349,-.25,8.5649,-22.4004,-.25,9.9,-22.3035,-.25,8.3],
// 3 320 -21.7349 -.25 8.5649 -22.3035 -.25 8.3 -22.3035 -.25 6.8
  [3,320,-21.7349,-.25,8.5649,-22.3035,-.25,8.3,-22.3035,-.25,6.8],
// 4 320 -21.6712 -.25 4.2827 -21.7349 -.25 8.5649 -22.3035 -.25 6.8 -22.3035 -.25 5.3
  [4,320,-21.6712,-.25,4.2827,-21.7349,-.25,8.5649,-22.3035,-.25,6.8,-22.3035,-.25,5.3],
// 4 320 -23.8035 -.25 8.3 -23.9004 -.25 9.9 -25.4004 -.25 9.9 -25.3035 -.25 8.3
  [4,320,-23.8035,-.25,8.3,-23.9004,-.25,9.9,-25.4004,-.25,9.9,-25.3035,-.25,8.3],
// 4 320 -23.8035 -.25 8.3 -22.3035 -.25 8.3 -22.4004 -.25 9.9 -23.9004 -.25 9.9
  [4,320,-23.8035,-.25,8.3,-22.3035,-.25,8.3,-22.4004,-.25,9.9,-23.9004,-.25,9.9],
// 3 320 -25.3035 -.25 5.3 -25.8984 -.25 4.5012 -25.2556 -.25 3.7
  [3,320,-25.3035,-.25,5.3,-25.8984,-.25,4.5012,-25.2556,-.25,3.7],
// 4 320 -25.3035 -.25 5.3 -25.2556 -.25 3.7 -23.7556 -.25 3.7 -23.8035 -.25 5.3
  [4,320,-25.3035,-.25,5.3,-25.2556,-.25,3.7,-23.7556,-.25,3.7,-23.8035,-.25,5.3],
// 4 320 -22.3035 -.25 5.3 -23.8035 -.25 5.3 -23.7556 -.25 3.7 -22.2556 -.25 3.7
  [4,320,-22.3035,-.25,5.3,-23.8035,-.25,5.3,-23.7556,-.25,3.7,-22.2556,-.25,3.7],
// 3 320 -22.3035 -.25 5.3 -22.2556 -.25 3.7 -21.6712 -.25 4.2827
  [3,320,-22.3035,-.25,5.3,-22.2556,-.25,3.7,-21.6712,-.25,4.2827],
// 4 320 -23.7556 -.25 .7 -25.2556 -.25 .7 -25.2556 -.25 -.7 -23.7556 -.25 -.7
  [4,320,-23.7556,-.25,.7,-25.2556,-.25,.7,-25.2556,-.25,-.7,-23.7556,-.25,-.7],
// 4 320 -23.7556 -.25 .7 -23.7556 -.25 -.7 -22.2556 -.25 -.7 -22.2556 -.25 .7
  [4,320,-23.7556,-.25,.7,-23.7556,-.25,-.7,-22.2556,-.25,-.7,-22.2556,-.25,.7],
// 4 320 -25.875 -.25 0 -25.2556 -.25 2.2 -25.2556 -.25 3.7 -25.8984 -.25 4.5012
  [4,320,-25.875,-.25,0,-25.2556,-.25,2.2,-25.2556,-.25,3.7,-25.8984,-.25,4.5012],
// 3 320 -25.875 -.25 0 -25.2556 -.25 .7 -25.2556 -.25 2.2
  [3,320,-25.875,-.25,0,-25.2556,-.25,.7,-25.2556,-.25,2.2],
// 3 320 -25.875 -.25 0 -25.2556 -.25 -.7 -25.2556 -.25 .7
  [3,320,-25.875,-.25,0,-25.2556,-.25,-.7,-25.2556,-.25,.7],
// 3 320 -25.875 -.25 0 -25.2556 -.25 -2.2 -25.2556 -.25 -.7
  [3,320,-25.875,-.25,0,-25.2556,-.25,-2.2,-25.2556,-.25,-.7],
// 4 320 -25.875 -.25 0 -25.8984 -.25 -4.5012 -25.2556 -.25 -3.7 -25.2556 -.25 -2.2
  [4,320,-25.875,-.25,0,-25.8984,-.25,-4.5012,-25.2556,-.25,-3.7,-25.2556,-.25,-2.2],
// 4 320 -21.65 -.25 0 -21.6712 -.25 4.2827 -22.2556 -.25 3.7 -22.2556 -.25 2.2
  [4,320,-21.65,-.25,0,-21.6712,-.25,4.2827,-22.2556,-.25,3.7,-22.2556,-.25,2.2],
// 3 320 -21.65 -.25 0 -22.2556 -.25 2.2 -22.2556 -.25 .7
  [3,320,-21.65,-.25,0,-22.2556,-.25,2.2,-22.2556,-.25,.7],
// 3 320 -21.65 -.25 0 -22.2556 -.25 .7 -22.2556 -.25 -.7
  [3,320,-21.65,-.25,0,-22.2556,-.25,.7,-22.2556,-.25,-.7],
// 3 320 -21.65 -.25 0 -22.2556 -.25 -.7 -22.2556 -.25 -2.2
  [3,320,-21.65,-.25,0,-22.2556,-.25,-.7,-22.2556,-.25,-2.2],
// 4 320 -21.65 -.25 0 -22.2556 -.25 -2.2 -22.2556 -.25 -3.7 -21.6712 -.25 -4.2827
  [4,320,-21.65,-.25,0,-22.2556,-.25,-2.2,-22.2556,-.25,-3.7,-21.6712,-.25,-4.2827],
// 3 320 -25.3035 -.25 -5.3 -25.2556 -.25 -3.7 -25.8984 -.25 -4.5012
  [3,320,-25.3035,-.25,-5.3,-25.2556,-.25,-3.7,-25.8984,-.25,-4.5012],
// 4 320 -25.3035 -.25 -5.3 -23.8035 -.25 -5.3 -23.7556 -.25 -3.7 -25.2556 -.25 -3.7
  [4,320,-25.3035,-.25,-5.3,-23.8035,-.25,-5.3,-23.7556,-.25,-3.7,-25.2556,-.25,-3.7],
// 4 320 -22.3035 -.25 -5.3 -22.2556 -.25 -3.7 -23.7556 -.25 -3.7 -23.8035 -.25 -5.3
  [4,320,-22.3035,-.25,-5.3,-22.2556,-.25,-3.7,-23.7556,-.25,-3.7,-23.8035,-.25,-5.3],
// 3 320 -22.3035 -.25 -5.3 -21.6712 -.25 -4.2827 -22.2556 -.25 -3.7
  [3,320,-22.3035,-.25,-5.3,-21.6712,-.25,-4.2827,-22.2556,-.25,-3.7],
// 4 320 -23.8035 -.25 -8.3 -25.3035 -.25 -8.3 -25.4004 -.25 -9.9 -23.9004 -.25 -9.9
  [4,320,-23.8035,-.25,-8.3,-25.3035,-.25,-8.3,-25.4004,-.25,-9.9,-23.9004,-.25,-9.9],
// 4 320 -23.8035 -.25 -8.3 -23.9004 -.25 -9.9 -22.4004 -.25 -9.9 -22.3035 -.25 -8.3
  [4,320,-23.8035,-.25,-8.3,-23.9004,-.25,-9.9,-22.4004,-.25,-9.9,-22.3035,-.25,-8.3],
// 4 320 -21.7349 -.25 -8.5649 -21.6712 -.25 -4.2827 -22.3035 -.25 -5.3 -22.3035 -.25 -6.8
  [4,320,-21.7349,-.25,-8.5649,-21.6712,-.25,-4.2827,-22.3035,-.25,-5.3,-22.3035,-.25,-6.8],
// 3 320 -21.7349 -.25 -8.5649 -22.3035 -.25 -6.8 -22.3035 -.25 -8.3
  [3,320,-21.7349,-.25,-8.5649,-22.3035,-.25,-6.8,-22.3035,-.25,-8.3],
// 3 320 -21.7349 -.25 -8.5649 -22.3035 -.25 -8.3 -22.4004 -.25 -9.9
  [3,320,-21.7349,-.25,-8.5649,-22.3035,-.25,-8.3,-22.4004,-.25,-9.9],
// 3 320 -21.7349 -.25 -8.5649 -22.4004 -.25 -9.9 -22.4004 -.25 -11.4
  [3,320,-21.7349,-.25,-8.5649,-22.4004,-.25,-9.9,-22.4004,-.25,-11.4],
// 4 320 -21.7349 -.25 -8.5649 -22.4004 -.25 -11.4 -22.4004 -.25 -12.9 -21.841 -.25 -12.8463
  [4,320,-21.7349,-.25,-8.5649,-22.4004,-.25,-11.4,-22.4004,-.25,-12.9,-21.841,-.25,-12.8463],
// 4 320 -25.9688 -.25 -9.002 -25.3035 -.25 -6.8 -25.3035 -.25 -5.3 -25.8984 -.25 -4.5012
  [4,320,-25.9688,-.25,-9.002,-25.3035,-.25,-6.8,-25.3035,-.25,-5.3,-25.8984,-.25,-4.5012],
// 3 320 -25.9688 -.25 -9.002 -25.3035 -.25 -8.3 -25.3035 -.25 -6.8
  [3,320,-25.9688,-.25,-9.002,-25.3035,-.25,-8.3,-25.3035,-.25,-6.8],
// 3 320 -25.9688 -.25 -9.002 -25.4004 -.25 -9.9 -25.3035 -.25 -8.3
  [3,320,-25.9688,-.25,-9.002,-25.4004,-.25,-9.9,-25.3035,-.25,-8.3],
// 3 320 -25.9688 -.25 -9.002 -25.4004 -.25 -11.4 -25.4004 -.25 -9.9
  [3,320,-25.9688,-.25,-9.002,-25.4004,-.25,-11.4,-25.4004,-.25,-9.9],
// 4 320 -25.9688 -.25 -9.002 -26.086 -.25 -13.5017 -25.4004 -.25 -12.9 -25.4004 -.25 -11.4
  [4,320,-25.9688,-.25,-9.002,-26.086,-.25,-13.5017,-25.4004,-.25,-12.9,-25.4004,-.25,-11.4],
// 4 320 -26.1953 -.25 -16.5 -23.9004 -.25 -12.9 -25.4004 -.25 -12.9 -26.086 -.25 -13.5017
  [4,320,-26.1953,-.25,-16.5,-23.9004,-.25,-12.9,-25.4004,-.25,-12.9,-26.086,-.25,-13.5017],
// 3 320 -26.1953 -.25 -16.5 -22.4004 -.25 -12.9 -23.9004 -.25 -12.9
  [3,320,-26.1953,-.25,-16.5,-22.4004,-.25,-12.9,-23.9004,-.25,-12.9],
// 3 320 -26.1953 -.25 -16.5 -21.841 -.25 -12.8463 -22.4004 -.25 -12.9
  [3,320,-26.1953,-.25,-16.5,-21.841,-.25,-12.8463,-22.4004,-.25,-12.9],
// 0 // White faces
// 4 15 -28.1228 -.25 -18 -28.1228 -.25 18 -29.6228 -.25 16.5 -29.6228 -.25 -16.5
  [4,15,-28.1228,-.25,-18,-28.1228,-.25,18,-29.6228,-.25,16.5,-29.6228,-.25,-16.5],
// 3 15 -28.1228 -.25 -18 -26.375 -.25 0 -28.1228 -.25 18
  [3,15,-28.1228,-.25,-18,-26.375,-.25,0,-28.1228,-.25,18],
// 4 15 -28.1228 -.25 18 -26.375 -.25 0 -26.3984 -.25 4.5012 -26.4688 -.25 9.002
  [4,15,-28.1228,-.25,18,-26.375,-.25,0,-26.3984,-.25,4.5012,-26.4688,-.25,9.002],
// 4 15 -28.1228 -.25 18 -26.4688 -.25 9.002 -26.586 -.25 13.5017 -26.75 -.25 18
  [4,15,-28.1228,-.25,18,-26.4688,-.25,9.002,-26.586,-.25,13.5017,-26.75,-.25,18],
// 3 15 28.1228 -.25 18 25.15 -.25 18 26.0664 -.25 13.5534
  [3,15,28.1228,-.25,18,25.15,-.25,18,26.0664,-.25,13.5534],
// 4 15 28.1228 -.25 18 26.0664 -.25 13.5534 26.7232 -.25 9.061 29.6228 -.25 16.5
  [4,15,28.1228,-.25,18,26.0664,-.25,13.5534,26.7232,-.25,9.061,29.6228,-.25,16.5],
// 3 15 29.6228 -.25 16.5 26.7232 -.25 9.061 27.1182 -.25 4.5382
  [3,15,29.6228,-.25,16.5,26.7232,-.25,9.061,27.1182,-.25,4.5382],
// 3 15 29.6228 -.25 16.5 27.1182 -.25 4.5382 27.25 -.25 0
  [3,15,29.6228,-.25,16.5,27.1182,-.25,4.5382,27.25,-.25,0],
// 3 15 29.6228 -.25 -16.5 29.6228 -.25 16.5 27.25 -.25 0
  [3,15,29.6228,-.25,-16.5,29.6228,-.25,16.5,27.25,-.25,0],
// 3 15 29.6228 -.25 -16.5 27.25 -.25 0 27.1182 -.25 -4.5382
  [3,15,29.6228,-.25,-16.5,27.25,-.25,0,27.1182,-.25,-4.5382],
// 3 15 29.6228 -.25 -16.5 27.1182 -.25 -4.5382 26.7232 -.25 -9.061
  [3,15,29.6228,-.25,-16.5,27.1182,-.25,-4.5382,26.7232,-.25,-9.061],
// 4 15 28.1228 -.25 -18 29.6228 -.25 -16.5 26.7232 -.25 -9.061 26.0664 -.25 -13.5534
  [4,15,28.1228,-.25,-18,29.6228,-.25,-16.5,26.7232,-.25,-9.061,26.0664,-.25,-13.5534],
// 4 15 -28.1228 -.25 -18 -26.4688 -.25 -9.002 -26.3984 -.25 -4.5012 -26.375 -.25 0
  [4,15,-28.1228,-.25,-18,-26.4688,-.25,-9.002,-26.3984,-.25,-4.5012,-26.375,-.25,0],
// 4 15 -28.1228 -.25 -18 -26.75 -.25 -18 -26.586 -.25 -13.5017 -26.4688 -.25 -9.002
  [4,15,-28.1228,-.25,-18,-26.75,-.25,-18,-26.586,-.25,-13.5017,-26.4688,-.25,-9.002],
// 3 15 28.1228 -.25 -18 26.0664 -.25 -13.5534 25.15 -.25 -18
  [3,15,28.1228,-.25,-18,26.0664,-.25,-13.5534,25.15,-.25,-18],
];
module ldraw_lib__6141955b(step=0, col=false, unit=2/5, alt=false, line=0.2, solid=!$preview)
    makepoly(ldraw_lib__6141955b(), step=step, col=col, unit=unit, alt=alt, line=line, solid=solid);
ldraw_lib__6141955b(line=0.2);
